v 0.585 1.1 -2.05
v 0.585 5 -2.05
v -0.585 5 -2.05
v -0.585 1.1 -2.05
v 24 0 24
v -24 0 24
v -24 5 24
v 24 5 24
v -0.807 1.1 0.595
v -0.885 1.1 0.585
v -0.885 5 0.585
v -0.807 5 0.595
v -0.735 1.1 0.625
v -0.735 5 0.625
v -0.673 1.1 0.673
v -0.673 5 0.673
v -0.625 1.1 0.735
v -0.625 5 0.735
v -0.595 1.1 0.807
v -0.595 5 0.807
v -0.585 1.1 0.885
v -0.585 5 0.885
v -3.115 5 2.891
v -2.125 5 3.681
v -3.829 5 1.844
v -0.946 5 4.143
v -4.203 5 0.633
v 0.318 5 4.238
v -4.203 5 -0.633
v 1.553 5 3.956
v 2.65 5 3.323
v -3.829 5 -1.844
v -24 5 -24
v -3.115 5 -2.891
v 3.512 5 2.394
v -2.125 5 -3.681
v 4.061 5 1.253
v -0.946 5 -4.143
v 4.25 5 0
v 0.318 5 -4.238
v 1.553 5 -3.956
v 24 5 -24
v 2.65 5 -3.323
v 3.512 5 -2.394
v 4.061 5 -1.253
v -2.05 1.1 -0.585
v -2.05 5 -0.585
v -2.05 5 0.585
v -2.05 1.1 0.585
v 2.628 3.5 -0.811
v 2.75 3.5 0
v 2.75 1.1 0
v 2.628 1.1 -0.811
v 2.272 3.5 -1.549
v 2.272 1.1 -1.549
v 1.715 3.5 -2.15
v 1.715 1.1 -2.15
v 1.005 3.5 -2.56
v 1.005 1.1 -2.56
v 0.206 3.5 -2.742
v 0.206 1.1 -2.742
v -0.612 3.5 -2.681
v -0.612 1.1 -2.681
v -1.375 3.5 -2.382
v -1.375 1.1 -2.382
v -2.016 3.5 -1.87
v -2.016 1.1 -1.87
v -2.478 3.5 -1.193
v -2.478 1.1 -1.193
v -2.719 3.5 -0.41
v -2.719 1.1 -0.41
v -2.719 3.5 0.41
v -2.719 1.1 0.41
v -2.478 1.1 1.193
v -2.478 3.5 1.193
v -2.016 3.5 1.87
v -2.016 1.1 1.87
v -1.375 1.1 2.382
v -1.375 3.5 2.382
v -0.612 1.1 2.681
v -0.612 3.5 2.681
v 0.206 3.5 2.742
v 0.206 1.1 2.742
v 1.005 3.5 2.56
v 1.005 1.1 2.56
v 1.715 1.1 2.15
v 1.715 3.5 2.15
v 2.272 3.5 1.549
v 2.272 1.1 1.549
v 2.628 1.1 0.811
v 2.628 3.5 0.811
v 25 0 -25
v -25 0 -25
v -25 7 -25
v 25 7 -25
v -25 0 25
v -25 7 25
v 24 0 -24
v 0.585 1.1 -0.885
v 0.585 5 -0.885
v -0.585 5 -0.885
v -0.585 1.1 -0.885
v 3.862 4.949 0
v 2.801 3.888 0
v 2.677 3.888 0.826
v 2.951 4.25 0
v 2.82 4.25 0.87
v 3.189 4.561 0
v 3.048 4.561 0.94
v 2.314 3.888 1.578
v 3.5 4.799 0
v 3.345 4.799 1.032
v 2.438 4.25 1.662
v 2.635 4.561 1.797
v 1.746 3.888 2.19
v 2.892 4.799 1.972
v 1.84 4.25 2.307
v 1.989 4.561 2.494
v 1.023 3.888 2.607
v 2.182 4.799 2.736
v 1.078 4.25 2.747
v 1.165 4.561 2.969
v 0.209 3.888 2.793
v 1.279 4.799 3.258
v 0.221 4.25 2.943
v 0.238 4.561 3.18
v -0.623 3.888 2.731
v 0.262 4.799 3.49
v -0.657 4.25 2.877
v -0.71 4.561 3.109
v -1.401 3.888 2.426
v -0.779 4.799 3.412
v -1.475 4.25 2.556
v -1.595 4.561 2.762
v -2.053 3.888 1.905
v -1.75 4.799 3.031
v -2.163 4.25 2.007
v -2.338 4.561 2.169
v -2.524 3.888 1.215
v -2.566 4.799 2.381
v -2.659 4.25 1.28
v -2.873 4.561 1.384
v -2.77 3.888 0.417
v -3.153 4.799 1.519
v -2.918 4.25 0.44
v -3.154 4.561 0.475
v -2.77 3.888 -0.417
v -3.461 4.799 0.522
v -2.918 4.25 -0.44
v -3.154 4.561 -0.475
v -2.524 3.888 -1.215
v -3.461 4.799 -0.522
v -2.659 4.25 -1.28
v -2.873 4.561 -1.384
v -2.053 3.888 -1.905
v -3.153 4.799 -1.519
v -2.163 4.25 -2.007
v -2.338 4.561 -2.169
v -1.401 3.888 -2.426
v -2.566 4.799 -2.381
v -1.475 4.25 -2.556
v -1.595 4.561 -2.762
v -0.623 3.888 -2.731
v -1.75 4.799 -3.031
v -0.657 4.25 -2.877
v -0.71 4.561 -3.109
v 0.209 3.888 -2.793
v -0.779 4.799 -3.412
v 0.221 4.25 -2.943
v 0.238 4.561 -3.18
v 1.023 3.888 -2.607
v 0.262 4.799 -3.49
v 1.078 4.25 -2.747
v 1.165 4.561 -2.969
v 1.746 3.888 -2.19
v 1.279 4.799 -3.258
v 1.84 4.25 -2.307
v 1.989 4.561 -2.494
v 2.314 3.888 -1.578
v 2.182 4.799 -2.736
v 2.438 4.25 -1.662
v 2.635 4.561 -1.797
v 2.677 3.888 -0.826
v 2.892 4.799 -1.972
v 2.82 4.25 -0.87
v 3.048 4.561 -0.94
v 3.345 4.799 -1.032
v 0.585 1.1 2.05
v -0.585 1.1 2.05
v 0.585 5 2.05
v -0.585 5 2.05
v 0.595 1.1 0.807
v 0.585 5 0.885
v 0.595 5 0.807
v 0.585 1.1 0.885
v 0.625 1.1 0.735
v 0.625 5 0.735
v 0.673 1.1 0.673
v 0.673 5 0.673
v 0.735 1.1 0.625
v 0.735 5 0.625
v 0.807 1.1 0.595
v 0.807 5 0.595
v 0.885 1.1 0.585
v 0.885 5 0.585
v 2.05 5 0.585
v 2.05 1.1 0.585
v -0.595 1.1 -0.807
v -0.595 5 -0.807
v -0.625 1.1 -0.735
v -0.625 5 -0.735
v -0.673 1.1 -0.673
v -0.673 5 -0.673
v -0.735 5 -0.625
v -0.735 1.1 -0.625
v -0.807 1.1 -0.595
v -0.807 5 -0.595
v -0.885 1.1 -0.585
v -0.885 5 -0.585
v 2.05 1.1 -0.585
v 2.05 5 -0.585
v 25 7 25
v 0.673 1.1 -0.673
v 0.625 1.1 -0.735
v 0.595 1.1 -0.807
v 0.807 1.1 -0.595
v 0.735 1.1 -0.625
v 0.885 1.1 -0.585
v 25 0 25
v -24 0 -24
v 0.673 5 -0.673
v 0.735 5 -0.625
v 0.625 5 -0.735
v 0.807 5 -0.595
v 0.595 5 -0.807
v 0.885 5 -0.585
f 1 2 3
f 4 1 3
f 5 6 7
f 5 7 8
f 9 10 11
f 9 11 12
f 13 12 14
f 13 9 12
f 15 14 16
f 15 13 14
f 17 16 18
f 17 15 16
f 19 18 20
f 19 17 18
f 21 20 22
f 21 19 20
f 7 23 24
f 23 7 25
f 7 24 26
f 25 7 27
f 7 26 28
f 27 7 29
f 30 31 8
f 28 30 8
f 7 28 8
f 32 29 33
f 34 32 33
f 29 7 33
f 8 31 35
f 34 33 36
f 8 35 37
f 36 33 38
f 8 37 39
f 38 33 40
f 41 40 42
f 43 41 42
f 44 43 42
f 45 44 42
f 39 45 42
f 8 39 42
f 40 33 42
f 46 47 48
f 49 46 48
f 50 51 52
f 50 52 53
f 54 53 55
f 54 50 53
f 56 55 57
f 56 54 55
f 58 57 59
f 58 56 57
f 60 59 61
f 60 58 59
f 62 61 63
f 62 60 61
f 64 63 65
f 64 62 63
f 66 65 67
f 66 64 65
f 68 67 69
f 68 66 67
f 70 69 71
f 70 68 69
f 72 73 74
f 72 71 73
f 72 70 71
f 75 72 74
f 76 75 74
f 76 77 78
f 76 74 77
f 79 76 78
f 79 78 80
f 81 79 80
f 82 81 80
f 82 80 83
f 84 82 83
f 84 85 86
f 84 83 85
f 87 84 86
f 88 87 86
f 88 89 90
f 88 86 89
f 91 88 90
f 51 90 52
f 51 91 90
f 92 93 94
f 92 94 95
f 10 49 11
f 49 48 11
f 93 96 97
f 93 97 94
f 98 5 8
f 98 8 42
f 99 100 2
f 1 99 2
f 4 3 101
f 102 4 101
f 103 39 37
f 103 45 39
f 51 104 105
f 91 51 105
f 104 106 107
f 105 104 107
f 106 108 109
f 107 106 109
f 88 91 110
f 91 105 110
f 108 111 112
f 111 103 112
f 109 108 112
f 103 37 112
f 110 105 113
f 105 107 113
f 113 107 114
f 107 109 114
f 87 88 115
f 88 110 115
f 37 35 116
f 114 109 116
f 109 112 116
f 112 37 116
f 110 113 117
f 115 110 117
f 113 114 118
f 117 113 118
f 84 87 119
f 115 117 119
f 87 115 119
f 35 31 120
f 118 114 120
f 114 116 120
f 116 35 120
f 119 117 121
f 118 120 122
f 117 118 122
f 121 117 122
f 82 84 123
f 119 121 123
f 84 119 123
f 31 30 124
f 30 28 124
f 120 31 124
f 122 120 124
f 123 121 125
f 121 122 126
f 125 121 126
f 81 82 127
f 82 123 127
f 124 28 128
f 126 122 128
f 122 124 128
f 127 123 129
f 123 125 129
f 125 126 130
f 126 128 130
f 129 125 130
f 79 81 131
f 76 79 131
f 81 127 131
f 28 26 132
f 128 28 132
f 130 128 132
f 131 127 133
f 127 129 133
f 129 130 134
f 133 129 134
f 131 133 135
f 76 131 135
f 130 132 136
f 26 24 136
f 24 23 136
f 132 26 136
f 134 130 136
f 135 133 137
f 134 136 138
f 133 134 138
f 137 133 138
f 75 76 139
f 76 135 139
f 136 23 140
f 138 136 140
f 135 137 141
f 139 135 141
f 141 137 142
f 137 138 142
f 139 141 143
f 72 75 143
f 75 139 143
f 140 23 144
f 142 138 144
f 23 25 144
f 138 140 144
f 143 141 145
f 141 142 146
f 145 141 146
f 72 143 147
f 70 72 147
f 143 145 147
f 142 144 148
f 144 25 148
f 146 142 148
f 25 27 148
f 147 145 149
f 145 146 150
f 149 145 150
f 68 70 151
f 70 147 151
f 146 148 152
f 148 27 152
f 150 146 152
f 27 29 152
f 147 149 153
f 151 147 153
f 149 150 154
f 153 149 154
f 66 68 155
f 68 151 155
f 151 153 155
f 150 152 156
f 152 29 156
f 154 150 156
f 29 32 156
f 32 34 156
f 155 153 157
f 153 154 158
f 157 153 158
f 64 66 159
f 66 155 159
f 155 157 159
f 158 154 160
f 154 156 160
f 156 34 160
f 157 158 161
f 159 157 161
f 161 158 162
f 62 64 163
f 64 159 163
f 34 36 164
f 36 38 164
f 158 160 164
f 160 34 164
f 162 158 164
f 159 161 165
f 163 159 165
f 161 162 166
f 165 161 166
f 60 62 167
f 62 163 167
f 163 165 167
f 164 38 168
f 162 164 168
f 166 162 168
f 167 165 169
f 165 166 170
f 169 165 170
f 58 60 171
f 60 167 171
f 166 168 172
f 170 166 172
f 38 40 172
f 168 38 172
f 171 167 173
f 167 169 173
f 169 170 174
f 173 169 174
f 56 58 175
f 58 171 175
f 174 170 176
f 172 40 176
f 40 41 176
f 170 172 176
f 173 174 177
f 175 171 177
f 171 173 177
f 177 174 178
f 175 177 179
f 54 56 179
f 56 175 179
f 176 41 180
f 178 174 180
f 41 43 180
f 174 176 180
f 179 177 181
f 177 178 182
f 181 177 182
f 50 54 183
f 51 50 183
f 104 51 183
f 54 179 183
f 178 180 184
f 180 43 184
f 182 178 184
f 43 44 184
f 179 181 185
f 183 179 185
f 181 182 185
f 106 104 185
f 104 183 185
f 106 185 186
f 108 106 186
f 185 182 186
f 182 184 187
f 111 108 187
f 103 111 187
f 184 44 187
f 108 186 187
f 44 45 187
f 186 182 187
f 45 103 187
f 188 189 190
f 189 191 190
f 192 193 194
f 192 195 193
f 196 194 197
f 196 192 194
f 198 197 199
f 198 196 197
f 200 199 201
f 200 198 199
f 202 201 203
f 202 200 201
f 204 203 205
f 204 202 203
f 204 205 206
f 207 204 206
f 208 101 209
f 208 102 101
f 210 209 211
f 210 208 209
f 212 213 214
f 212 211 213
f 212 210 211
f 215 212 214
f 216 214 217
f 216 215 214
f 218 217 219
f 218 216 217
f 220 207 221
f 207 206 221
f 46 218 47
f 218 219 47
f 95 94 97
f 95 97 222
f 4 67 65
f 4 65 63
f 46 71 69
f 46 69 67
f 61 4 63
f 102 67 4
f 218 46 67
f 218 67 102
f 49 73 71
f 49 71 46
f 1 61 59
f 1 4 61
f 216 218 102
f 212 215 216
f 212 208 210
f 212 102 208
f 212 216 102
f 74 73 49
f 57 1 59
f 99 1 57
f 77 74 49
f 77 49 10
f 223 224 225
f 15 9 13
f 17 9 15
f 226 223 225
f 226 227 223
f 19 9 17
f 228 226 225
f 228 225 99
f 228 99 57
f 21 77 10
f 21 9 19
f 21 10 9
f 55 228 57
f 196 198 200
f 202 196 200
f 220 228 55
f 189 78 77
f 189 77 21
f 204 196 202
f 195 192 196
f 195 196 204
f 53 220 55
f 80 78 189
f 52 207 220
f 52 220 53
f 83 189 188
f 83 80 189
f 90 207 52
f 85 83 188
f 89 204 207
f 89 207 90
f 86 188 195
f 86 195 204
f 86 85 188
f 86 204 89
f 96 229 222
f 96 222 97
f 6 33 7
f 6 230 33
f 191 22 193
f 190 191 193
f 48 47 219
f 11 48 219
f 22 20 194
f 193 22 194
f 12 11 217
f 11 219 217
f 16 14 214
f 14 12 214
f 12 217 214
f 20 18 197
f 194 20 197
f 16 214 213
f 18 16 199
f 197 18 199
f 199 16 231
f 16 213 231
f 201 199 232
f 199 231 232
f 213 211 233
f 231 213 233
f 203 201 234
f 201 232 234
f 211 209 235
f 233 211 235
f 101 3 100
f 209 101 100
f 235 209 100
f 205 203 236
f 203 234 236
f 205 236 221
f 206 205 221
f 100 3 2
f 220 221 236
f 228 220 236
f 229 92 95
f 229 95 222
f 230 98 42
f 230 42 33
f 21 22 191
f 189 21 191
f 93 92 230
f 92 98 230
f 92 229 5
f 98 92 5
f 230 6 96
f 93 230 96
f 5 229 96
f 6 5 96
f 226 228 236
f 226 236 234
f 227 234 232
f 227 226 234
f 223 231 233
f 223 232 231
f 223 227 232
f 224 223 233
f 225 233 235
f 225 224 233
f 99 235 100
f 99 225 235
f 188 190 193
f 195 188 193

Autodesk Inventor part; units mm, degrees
ref_plane "YZ Plane" through (0, 0, 0) normal (1, 0, 0) x (0, 1, 0)
ref_plane "XZ Plane" through (0, 0, 0) normal (0, 1, 0) x (-1, 0, 0)
ref_plane "XY Plane" through (0, 0, 0) normal (0, 0, 1) x (1, 0, 0)
sketch "Sketch1" plane through (0, 0, 0) normal (0, 1, 0) x (-1, 0, 0)
  line L0 (24, 24) -> (-24, 24)
  line L1 (-24, 24) -> (-24, -24)
  line L2 (-24, -24) -> (24, -24)
  line L3 (24, -24) -> (24, 24)
  line L4 (24, 24) -> (-24, -24) construction
  line L5 (-24, 24) -> (24, -24) construction
  line L6 (-25, 25) -> (25, 25)
  line L7 (25, 25) -> (25, -25)
  line L8 (25, -25) -> (-25, -25)
  line L9 (-25, -25) -> (-25, 25)
  line L10 (-25, 25) -> (25, -25) construction
  line L11 (25, 25) -> (-25, -25) construction
  point P0 (0, 0)
extrude "Extrusion1" add sketch "Sketch1" along normal blind 5
sketch "Sketch2" plane through (0, 5, 0) normal (0, 1, 0) x (1, 0, 0)
  line L0 (-25, -25) -> (25, -25) projected
  line L1 (25, 25) -> (-25, 25) projected
  line L2 (-25, -25) -> (25, -25)
  line L3 (25, -25) -> (25, 25)
  line L4 (25, 25) -> (-25, 25)
  line L5 (-25, 25) -> (-25, -25)
  point P0 (0, 0)
extrude "Extrusion2" add sketch "Sketch2" along normal blind 2
sketch "Sketch3" plane through (0, 5, 0) normal (0, -1, 0) x (1, 0, 0)
  line L0 (24, -24) -> (24, 24) projected
  line L1 (24, 24) -> (-24, 24) projected
  line L2 (-24, -24) -> (24, -24) projected
  line L3 (-24, 24) -> (-24, -24) projected
  circle A0 centre (0, 0) radius 2.75
  line L4 (2.05, 0.585) -> (2.05, -0.585)
  line L5 (-2.05, -0.585) -> (-2.05, 0.585)
  line L6 (-0.585, 2.05) -> (0.585, 2.05)
  line L7 (0.585, -2.05) -> (-0.585, -2.05)
  line L8 (-2.05, 0.585) -> (-0.585, 0.585)
  line L9 (0.585, 0.585) -> (2.05, 0.585)
  line L10 (-0.585, -2.05) -> (-0.585, -0.585)
  line L11 (-0.585, 0.585) -> (-0.585, 2.05)
  line L12 (2.05, -0.585) -> (0.585, -0.585)
  line L13 (-0.585, -0.585) -> (-2.05, -0.585)
  line L14 (0.585, 2.05) -> (0.585, 0.585)
  line L15 (0.585, -0.585) -> (0.585, -2.05)
extrude "Extrusion3" add sketch "Sketch3" along normal blind 3.9 contours A0
fillet "Fillet1" radius 0.3 4 edges at (0.585, 3.05, 0.585) (0.585, 3.05, -0.585) (-0.585, 3.05, 0.585) (-0.585, 3.05, -0.585)
fillet "Fillet2" radius 1.5 1 edges at (-2.75, 5, 0)
